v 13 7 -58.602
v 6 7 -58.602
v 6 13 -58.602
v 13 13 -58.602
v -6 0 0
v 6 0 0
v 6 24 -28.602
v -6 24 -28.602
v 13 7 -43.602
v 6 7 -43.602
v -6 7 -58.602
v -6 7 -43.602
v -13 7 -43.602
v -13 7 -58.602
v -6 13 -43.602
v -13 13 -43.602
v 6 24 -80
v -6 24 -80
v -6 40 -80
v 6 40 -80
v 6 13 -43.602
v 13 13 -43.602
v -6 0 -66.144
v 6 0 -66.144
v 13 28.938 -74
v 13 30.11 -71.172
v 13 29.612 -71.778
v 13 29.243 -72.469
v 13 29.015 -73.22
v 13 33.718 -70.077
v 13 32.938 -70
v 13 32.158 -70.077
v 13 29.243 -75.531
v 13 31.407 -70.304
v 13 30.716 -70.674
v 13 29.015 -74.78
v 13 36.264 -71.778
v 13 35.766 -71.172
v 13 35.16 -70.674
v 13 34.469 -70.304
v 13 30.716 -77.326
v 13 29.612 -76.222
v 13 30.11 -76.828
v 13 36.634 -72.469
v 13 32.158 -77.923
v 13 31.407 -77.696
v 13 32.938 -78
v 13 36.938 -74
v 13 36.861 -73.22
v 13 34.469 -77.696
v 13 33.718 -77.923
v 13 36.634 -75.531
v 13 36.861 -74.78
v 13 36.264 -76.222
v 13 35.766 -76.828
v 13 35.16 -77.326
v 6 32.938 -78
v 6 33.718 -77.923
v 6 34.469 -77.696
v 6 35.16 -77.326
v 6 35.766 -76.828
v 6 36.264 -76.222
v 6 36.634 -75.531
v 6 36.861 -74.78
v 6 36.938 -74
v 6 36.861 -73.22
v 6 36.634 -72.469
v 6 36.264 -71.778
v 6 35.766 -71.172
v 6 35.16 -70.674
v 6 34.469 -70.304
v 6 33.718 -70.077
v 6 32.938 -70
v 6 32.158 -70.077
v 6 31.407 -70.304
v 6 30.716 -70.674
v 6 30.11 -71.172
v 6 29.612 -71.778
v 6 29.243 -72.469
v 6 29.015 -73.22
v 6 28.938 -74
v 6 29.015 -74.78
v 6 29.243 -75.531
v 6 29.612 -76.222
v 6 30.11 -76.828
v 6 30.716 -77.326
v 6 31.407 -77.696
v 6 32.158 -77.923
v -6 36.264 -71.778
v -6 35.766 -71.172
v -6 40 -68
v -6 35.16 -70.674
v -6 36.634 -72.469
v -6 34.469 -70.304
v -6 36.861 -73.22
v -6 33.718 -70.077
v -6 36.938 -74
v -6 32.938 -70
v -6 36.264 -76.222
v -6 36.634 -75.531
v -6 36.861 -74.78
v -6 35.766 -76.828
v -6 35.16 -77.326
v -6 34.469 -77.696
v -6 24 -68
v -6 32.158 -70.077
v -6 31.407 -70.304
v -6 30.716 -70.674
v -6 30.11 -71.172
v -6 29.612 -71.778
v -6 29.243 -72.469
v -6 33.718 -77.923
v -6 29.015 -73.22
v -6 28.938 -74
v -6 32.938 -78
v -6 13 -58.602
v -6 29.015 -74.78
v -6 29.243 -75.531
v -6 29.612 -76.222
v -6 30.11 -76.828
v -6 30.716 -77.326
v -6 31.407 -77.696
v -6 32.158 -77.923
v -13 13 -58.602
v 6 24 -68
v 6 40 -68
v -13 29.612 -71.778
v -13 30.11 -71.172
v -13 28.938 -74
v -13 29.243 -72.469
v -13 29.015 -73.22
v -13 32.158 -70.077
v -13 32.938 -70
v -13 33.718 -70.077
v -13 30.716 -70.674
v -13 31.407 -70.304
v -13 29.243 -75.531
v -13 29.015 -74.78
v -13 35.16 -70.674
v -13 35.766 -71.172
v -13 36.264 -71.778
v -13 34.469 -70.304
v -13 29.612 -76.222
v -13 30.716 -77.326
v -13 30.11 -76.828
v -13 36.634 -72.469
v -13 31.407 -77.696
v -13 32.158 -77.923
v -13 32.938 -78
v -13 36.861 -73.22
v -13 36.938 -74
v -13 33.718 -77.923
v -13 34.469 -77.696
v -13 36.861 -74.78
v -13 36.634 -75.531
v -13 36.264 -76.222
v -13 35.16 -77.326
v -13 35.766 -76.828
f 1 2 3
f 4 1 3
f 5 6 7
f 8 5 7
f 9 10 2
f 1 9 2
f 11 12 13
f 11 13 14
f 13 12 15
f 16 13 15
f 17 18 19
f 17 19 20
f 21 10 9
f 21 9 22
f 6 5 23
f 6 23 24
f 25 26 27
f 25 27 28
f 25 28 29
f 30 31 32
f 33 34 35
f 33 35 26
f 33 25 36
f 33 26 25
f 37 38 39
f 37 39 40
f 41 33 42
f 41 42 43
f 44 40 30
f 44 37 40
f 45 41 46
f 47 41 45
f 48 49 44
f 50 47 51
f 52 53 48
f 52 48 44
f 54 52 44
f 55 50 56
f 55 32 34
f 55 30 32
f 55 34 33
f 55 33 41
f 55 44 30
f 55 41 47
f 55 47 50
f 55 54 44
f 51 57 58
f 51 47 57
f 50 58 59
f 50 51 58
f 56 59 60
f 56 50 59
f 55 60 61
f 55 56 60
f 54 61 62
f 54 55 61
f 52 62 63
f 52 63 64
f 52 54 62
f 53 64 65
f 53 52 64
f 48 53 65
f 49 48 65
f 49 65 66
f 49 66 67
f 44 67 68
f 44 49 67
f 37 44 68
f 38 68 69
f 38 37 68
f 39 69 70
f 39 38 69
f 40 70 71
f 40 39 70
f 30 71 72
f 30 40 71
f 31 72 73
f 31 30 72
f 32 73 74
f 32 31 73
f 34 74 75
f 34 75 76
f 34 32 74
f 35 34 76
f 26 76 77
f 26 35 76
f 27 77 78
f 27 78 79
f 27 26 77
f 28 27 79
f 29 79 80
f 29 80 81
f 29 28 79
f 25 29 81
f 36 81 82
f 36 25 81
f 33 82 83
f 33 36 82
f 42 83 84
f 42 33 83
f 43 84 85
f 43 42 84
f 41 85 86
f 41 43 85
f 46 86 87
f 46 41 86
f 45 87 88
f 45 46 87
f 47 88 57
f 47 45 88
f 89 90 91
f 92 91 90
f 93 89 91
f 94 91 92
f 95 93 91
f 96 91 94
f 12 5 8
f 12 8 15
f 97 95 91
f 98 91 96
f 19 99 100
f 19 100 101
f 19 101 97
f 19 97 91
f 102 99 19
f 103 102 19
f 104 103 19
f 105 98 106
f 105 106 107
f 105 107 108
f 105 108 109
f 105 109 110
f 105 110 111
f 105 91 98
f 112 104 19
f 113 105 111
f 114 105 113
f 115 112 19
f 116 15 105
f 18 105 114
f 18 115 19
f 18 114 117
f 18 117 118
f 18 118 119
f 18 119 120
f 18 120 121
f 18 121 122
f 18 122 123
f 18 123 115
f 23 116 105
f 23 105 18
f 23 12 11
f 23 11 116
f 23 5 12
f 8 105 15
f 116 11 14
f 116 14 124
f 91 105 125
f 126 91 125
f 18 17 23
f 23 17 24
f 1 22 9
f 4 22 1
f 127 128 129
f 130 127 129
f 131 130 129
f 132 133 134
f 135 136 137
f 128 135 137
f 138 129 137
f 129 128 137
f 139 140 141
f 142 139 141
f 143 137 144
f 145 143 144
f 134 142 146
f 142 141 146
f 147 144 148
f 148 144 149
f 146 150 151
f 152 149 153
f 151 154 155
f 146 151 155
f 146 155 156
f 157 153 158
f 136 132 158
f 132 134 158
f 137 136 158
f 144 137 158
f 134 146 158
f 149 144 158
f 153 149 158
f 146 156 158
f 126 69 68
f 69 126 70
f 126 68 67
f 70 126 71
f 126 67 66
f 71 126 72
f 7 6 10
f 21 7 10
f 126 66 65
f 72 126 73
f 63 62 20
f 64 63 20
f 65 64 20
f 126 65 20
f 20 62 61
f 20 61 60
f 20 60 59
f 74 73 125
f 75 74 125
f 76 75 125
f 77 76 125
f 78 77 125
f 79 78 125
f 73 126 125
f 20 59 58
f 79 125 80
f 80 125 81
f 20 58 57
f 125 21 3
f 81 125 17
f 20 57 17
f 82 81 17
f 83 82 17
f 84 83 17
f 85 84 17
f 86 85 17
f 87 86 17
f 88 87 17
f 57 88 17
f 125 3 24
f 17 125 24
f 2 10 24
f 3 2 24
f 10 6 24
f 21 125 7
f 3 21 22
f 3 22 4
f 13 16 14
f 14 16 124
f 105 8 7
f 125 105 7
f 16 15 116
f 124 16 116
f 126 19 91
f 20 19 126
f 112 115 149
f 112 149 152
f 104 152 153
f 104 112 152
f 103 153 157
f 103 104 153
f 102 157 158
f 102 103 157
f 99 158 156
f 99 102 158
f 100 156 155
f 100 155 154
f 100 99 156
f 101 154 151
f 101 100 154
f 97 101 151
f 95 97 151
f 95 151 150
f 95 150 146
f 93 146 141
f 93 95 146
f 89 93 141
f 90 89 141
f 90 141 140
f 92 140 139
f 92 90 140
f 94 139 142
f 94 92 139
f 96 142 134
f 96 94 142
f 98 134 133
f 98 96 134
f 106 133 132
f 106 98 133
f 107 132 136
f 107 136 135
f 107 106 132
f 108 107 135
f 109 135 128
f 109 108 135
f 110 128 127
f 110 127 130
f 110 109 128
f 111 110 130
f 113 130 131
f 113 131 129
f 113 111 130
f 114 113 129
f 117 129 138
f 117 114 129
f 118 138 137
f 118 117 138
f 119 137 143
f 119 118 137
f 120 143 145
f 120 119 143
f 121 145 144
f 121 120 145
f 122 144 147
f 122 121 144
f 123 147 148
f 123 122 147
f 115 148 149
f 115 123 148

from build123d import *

# Parameters (mm, degrees)
SKETCH1_W           = 12
SKETCH1_H           = 24
BOSS_EXTRUDE1_DEPTH = 80
CUT_EXTRUDE1_DEPTH  = 12
SKETCH4_W           = 15
SKETCH4_H           = 6
BOSS_EXTRUDE2_DEPTH = 7
SKETCH5_W           = 12
SKETCH5_H           = 12
BOSS_EXTRUDE3_DEPTH = 16
SKETCH7_R           = 4
BOSS_EXTRUDE4_DEPTH = 13


with BuildPart() as part:
    # Sketch1 → Boss-Extrude1 (new body)
    with BuildSketch(Plane.XY):
        with Locations((0, 12)):
            Rectangle(SKETCH1_W, SKETCH1_H)
    extrude(amount=-BOSS_EXTRUDE1_DEPTH)

    # Sketch2 → Cut-Extrude1 (cut)
    with BuildSketch(Plane(origin=(6, 0, 0), x_dir=(0, 0, -1), z_dir=(1, 0, 0))):
        Polygon((0, 24), (0, 0), (28.602086222, 24), align=None)
        Polygon((80, 24), (66.143593539, 0), (80, 0), align=None)
    extrude(amount=-CUT_EXTRUDE1_DEPTH, mode=Mode.SUBTRACT)

    # Sketch4 → Boss-Extrude2 (add)
    with BuildSketch(Plane(origin=(6, 0, 0), x_dir=(0, 0, -1), z_dir=(1, 0, 0))):
        with Locations((51.102086222, 10)):
            Rectangle(SKETCH4_W, SKETCH4_H)
    boss_extrude2 = extrude(amount=BOSS_EXTRUDE2_DEPTH)

    # Mirror1: Boss-Extrude2 across plane
    add(boss_extrude2.mirror(Plane(origin=(0, 0, 0), x_dir=(0, 0, 1), z_dir=(1, 0, 0))))

    # Sketch5 → Boss-Extrude3 (add)
    with BuildSketch(Plane(origin=(0, 24, 0), x_dir=(1, 0, 0), z_dir=(0, 1, 0))):
        with Locations((0, 74)):
            Rectangle(SKETCH5_W, SKETCH5_H)
    extrude(amount=BOSS_EXTRUDE3_DEPTH)

    # Sketch7 → Boss-Extrude4 (add, symmetric)
    with BuildSketch(Plane(origin=(0, 0, 0), x_dir=(0, 0, -1), z_dir=(1, 0, 0))):
        with Locations((74, 32.938039716)):
            Circle(SKETCH7_R)
    extrude(amount=BOSS_EXTRUDE4_DEPTH, both=True)


solid = part.part
